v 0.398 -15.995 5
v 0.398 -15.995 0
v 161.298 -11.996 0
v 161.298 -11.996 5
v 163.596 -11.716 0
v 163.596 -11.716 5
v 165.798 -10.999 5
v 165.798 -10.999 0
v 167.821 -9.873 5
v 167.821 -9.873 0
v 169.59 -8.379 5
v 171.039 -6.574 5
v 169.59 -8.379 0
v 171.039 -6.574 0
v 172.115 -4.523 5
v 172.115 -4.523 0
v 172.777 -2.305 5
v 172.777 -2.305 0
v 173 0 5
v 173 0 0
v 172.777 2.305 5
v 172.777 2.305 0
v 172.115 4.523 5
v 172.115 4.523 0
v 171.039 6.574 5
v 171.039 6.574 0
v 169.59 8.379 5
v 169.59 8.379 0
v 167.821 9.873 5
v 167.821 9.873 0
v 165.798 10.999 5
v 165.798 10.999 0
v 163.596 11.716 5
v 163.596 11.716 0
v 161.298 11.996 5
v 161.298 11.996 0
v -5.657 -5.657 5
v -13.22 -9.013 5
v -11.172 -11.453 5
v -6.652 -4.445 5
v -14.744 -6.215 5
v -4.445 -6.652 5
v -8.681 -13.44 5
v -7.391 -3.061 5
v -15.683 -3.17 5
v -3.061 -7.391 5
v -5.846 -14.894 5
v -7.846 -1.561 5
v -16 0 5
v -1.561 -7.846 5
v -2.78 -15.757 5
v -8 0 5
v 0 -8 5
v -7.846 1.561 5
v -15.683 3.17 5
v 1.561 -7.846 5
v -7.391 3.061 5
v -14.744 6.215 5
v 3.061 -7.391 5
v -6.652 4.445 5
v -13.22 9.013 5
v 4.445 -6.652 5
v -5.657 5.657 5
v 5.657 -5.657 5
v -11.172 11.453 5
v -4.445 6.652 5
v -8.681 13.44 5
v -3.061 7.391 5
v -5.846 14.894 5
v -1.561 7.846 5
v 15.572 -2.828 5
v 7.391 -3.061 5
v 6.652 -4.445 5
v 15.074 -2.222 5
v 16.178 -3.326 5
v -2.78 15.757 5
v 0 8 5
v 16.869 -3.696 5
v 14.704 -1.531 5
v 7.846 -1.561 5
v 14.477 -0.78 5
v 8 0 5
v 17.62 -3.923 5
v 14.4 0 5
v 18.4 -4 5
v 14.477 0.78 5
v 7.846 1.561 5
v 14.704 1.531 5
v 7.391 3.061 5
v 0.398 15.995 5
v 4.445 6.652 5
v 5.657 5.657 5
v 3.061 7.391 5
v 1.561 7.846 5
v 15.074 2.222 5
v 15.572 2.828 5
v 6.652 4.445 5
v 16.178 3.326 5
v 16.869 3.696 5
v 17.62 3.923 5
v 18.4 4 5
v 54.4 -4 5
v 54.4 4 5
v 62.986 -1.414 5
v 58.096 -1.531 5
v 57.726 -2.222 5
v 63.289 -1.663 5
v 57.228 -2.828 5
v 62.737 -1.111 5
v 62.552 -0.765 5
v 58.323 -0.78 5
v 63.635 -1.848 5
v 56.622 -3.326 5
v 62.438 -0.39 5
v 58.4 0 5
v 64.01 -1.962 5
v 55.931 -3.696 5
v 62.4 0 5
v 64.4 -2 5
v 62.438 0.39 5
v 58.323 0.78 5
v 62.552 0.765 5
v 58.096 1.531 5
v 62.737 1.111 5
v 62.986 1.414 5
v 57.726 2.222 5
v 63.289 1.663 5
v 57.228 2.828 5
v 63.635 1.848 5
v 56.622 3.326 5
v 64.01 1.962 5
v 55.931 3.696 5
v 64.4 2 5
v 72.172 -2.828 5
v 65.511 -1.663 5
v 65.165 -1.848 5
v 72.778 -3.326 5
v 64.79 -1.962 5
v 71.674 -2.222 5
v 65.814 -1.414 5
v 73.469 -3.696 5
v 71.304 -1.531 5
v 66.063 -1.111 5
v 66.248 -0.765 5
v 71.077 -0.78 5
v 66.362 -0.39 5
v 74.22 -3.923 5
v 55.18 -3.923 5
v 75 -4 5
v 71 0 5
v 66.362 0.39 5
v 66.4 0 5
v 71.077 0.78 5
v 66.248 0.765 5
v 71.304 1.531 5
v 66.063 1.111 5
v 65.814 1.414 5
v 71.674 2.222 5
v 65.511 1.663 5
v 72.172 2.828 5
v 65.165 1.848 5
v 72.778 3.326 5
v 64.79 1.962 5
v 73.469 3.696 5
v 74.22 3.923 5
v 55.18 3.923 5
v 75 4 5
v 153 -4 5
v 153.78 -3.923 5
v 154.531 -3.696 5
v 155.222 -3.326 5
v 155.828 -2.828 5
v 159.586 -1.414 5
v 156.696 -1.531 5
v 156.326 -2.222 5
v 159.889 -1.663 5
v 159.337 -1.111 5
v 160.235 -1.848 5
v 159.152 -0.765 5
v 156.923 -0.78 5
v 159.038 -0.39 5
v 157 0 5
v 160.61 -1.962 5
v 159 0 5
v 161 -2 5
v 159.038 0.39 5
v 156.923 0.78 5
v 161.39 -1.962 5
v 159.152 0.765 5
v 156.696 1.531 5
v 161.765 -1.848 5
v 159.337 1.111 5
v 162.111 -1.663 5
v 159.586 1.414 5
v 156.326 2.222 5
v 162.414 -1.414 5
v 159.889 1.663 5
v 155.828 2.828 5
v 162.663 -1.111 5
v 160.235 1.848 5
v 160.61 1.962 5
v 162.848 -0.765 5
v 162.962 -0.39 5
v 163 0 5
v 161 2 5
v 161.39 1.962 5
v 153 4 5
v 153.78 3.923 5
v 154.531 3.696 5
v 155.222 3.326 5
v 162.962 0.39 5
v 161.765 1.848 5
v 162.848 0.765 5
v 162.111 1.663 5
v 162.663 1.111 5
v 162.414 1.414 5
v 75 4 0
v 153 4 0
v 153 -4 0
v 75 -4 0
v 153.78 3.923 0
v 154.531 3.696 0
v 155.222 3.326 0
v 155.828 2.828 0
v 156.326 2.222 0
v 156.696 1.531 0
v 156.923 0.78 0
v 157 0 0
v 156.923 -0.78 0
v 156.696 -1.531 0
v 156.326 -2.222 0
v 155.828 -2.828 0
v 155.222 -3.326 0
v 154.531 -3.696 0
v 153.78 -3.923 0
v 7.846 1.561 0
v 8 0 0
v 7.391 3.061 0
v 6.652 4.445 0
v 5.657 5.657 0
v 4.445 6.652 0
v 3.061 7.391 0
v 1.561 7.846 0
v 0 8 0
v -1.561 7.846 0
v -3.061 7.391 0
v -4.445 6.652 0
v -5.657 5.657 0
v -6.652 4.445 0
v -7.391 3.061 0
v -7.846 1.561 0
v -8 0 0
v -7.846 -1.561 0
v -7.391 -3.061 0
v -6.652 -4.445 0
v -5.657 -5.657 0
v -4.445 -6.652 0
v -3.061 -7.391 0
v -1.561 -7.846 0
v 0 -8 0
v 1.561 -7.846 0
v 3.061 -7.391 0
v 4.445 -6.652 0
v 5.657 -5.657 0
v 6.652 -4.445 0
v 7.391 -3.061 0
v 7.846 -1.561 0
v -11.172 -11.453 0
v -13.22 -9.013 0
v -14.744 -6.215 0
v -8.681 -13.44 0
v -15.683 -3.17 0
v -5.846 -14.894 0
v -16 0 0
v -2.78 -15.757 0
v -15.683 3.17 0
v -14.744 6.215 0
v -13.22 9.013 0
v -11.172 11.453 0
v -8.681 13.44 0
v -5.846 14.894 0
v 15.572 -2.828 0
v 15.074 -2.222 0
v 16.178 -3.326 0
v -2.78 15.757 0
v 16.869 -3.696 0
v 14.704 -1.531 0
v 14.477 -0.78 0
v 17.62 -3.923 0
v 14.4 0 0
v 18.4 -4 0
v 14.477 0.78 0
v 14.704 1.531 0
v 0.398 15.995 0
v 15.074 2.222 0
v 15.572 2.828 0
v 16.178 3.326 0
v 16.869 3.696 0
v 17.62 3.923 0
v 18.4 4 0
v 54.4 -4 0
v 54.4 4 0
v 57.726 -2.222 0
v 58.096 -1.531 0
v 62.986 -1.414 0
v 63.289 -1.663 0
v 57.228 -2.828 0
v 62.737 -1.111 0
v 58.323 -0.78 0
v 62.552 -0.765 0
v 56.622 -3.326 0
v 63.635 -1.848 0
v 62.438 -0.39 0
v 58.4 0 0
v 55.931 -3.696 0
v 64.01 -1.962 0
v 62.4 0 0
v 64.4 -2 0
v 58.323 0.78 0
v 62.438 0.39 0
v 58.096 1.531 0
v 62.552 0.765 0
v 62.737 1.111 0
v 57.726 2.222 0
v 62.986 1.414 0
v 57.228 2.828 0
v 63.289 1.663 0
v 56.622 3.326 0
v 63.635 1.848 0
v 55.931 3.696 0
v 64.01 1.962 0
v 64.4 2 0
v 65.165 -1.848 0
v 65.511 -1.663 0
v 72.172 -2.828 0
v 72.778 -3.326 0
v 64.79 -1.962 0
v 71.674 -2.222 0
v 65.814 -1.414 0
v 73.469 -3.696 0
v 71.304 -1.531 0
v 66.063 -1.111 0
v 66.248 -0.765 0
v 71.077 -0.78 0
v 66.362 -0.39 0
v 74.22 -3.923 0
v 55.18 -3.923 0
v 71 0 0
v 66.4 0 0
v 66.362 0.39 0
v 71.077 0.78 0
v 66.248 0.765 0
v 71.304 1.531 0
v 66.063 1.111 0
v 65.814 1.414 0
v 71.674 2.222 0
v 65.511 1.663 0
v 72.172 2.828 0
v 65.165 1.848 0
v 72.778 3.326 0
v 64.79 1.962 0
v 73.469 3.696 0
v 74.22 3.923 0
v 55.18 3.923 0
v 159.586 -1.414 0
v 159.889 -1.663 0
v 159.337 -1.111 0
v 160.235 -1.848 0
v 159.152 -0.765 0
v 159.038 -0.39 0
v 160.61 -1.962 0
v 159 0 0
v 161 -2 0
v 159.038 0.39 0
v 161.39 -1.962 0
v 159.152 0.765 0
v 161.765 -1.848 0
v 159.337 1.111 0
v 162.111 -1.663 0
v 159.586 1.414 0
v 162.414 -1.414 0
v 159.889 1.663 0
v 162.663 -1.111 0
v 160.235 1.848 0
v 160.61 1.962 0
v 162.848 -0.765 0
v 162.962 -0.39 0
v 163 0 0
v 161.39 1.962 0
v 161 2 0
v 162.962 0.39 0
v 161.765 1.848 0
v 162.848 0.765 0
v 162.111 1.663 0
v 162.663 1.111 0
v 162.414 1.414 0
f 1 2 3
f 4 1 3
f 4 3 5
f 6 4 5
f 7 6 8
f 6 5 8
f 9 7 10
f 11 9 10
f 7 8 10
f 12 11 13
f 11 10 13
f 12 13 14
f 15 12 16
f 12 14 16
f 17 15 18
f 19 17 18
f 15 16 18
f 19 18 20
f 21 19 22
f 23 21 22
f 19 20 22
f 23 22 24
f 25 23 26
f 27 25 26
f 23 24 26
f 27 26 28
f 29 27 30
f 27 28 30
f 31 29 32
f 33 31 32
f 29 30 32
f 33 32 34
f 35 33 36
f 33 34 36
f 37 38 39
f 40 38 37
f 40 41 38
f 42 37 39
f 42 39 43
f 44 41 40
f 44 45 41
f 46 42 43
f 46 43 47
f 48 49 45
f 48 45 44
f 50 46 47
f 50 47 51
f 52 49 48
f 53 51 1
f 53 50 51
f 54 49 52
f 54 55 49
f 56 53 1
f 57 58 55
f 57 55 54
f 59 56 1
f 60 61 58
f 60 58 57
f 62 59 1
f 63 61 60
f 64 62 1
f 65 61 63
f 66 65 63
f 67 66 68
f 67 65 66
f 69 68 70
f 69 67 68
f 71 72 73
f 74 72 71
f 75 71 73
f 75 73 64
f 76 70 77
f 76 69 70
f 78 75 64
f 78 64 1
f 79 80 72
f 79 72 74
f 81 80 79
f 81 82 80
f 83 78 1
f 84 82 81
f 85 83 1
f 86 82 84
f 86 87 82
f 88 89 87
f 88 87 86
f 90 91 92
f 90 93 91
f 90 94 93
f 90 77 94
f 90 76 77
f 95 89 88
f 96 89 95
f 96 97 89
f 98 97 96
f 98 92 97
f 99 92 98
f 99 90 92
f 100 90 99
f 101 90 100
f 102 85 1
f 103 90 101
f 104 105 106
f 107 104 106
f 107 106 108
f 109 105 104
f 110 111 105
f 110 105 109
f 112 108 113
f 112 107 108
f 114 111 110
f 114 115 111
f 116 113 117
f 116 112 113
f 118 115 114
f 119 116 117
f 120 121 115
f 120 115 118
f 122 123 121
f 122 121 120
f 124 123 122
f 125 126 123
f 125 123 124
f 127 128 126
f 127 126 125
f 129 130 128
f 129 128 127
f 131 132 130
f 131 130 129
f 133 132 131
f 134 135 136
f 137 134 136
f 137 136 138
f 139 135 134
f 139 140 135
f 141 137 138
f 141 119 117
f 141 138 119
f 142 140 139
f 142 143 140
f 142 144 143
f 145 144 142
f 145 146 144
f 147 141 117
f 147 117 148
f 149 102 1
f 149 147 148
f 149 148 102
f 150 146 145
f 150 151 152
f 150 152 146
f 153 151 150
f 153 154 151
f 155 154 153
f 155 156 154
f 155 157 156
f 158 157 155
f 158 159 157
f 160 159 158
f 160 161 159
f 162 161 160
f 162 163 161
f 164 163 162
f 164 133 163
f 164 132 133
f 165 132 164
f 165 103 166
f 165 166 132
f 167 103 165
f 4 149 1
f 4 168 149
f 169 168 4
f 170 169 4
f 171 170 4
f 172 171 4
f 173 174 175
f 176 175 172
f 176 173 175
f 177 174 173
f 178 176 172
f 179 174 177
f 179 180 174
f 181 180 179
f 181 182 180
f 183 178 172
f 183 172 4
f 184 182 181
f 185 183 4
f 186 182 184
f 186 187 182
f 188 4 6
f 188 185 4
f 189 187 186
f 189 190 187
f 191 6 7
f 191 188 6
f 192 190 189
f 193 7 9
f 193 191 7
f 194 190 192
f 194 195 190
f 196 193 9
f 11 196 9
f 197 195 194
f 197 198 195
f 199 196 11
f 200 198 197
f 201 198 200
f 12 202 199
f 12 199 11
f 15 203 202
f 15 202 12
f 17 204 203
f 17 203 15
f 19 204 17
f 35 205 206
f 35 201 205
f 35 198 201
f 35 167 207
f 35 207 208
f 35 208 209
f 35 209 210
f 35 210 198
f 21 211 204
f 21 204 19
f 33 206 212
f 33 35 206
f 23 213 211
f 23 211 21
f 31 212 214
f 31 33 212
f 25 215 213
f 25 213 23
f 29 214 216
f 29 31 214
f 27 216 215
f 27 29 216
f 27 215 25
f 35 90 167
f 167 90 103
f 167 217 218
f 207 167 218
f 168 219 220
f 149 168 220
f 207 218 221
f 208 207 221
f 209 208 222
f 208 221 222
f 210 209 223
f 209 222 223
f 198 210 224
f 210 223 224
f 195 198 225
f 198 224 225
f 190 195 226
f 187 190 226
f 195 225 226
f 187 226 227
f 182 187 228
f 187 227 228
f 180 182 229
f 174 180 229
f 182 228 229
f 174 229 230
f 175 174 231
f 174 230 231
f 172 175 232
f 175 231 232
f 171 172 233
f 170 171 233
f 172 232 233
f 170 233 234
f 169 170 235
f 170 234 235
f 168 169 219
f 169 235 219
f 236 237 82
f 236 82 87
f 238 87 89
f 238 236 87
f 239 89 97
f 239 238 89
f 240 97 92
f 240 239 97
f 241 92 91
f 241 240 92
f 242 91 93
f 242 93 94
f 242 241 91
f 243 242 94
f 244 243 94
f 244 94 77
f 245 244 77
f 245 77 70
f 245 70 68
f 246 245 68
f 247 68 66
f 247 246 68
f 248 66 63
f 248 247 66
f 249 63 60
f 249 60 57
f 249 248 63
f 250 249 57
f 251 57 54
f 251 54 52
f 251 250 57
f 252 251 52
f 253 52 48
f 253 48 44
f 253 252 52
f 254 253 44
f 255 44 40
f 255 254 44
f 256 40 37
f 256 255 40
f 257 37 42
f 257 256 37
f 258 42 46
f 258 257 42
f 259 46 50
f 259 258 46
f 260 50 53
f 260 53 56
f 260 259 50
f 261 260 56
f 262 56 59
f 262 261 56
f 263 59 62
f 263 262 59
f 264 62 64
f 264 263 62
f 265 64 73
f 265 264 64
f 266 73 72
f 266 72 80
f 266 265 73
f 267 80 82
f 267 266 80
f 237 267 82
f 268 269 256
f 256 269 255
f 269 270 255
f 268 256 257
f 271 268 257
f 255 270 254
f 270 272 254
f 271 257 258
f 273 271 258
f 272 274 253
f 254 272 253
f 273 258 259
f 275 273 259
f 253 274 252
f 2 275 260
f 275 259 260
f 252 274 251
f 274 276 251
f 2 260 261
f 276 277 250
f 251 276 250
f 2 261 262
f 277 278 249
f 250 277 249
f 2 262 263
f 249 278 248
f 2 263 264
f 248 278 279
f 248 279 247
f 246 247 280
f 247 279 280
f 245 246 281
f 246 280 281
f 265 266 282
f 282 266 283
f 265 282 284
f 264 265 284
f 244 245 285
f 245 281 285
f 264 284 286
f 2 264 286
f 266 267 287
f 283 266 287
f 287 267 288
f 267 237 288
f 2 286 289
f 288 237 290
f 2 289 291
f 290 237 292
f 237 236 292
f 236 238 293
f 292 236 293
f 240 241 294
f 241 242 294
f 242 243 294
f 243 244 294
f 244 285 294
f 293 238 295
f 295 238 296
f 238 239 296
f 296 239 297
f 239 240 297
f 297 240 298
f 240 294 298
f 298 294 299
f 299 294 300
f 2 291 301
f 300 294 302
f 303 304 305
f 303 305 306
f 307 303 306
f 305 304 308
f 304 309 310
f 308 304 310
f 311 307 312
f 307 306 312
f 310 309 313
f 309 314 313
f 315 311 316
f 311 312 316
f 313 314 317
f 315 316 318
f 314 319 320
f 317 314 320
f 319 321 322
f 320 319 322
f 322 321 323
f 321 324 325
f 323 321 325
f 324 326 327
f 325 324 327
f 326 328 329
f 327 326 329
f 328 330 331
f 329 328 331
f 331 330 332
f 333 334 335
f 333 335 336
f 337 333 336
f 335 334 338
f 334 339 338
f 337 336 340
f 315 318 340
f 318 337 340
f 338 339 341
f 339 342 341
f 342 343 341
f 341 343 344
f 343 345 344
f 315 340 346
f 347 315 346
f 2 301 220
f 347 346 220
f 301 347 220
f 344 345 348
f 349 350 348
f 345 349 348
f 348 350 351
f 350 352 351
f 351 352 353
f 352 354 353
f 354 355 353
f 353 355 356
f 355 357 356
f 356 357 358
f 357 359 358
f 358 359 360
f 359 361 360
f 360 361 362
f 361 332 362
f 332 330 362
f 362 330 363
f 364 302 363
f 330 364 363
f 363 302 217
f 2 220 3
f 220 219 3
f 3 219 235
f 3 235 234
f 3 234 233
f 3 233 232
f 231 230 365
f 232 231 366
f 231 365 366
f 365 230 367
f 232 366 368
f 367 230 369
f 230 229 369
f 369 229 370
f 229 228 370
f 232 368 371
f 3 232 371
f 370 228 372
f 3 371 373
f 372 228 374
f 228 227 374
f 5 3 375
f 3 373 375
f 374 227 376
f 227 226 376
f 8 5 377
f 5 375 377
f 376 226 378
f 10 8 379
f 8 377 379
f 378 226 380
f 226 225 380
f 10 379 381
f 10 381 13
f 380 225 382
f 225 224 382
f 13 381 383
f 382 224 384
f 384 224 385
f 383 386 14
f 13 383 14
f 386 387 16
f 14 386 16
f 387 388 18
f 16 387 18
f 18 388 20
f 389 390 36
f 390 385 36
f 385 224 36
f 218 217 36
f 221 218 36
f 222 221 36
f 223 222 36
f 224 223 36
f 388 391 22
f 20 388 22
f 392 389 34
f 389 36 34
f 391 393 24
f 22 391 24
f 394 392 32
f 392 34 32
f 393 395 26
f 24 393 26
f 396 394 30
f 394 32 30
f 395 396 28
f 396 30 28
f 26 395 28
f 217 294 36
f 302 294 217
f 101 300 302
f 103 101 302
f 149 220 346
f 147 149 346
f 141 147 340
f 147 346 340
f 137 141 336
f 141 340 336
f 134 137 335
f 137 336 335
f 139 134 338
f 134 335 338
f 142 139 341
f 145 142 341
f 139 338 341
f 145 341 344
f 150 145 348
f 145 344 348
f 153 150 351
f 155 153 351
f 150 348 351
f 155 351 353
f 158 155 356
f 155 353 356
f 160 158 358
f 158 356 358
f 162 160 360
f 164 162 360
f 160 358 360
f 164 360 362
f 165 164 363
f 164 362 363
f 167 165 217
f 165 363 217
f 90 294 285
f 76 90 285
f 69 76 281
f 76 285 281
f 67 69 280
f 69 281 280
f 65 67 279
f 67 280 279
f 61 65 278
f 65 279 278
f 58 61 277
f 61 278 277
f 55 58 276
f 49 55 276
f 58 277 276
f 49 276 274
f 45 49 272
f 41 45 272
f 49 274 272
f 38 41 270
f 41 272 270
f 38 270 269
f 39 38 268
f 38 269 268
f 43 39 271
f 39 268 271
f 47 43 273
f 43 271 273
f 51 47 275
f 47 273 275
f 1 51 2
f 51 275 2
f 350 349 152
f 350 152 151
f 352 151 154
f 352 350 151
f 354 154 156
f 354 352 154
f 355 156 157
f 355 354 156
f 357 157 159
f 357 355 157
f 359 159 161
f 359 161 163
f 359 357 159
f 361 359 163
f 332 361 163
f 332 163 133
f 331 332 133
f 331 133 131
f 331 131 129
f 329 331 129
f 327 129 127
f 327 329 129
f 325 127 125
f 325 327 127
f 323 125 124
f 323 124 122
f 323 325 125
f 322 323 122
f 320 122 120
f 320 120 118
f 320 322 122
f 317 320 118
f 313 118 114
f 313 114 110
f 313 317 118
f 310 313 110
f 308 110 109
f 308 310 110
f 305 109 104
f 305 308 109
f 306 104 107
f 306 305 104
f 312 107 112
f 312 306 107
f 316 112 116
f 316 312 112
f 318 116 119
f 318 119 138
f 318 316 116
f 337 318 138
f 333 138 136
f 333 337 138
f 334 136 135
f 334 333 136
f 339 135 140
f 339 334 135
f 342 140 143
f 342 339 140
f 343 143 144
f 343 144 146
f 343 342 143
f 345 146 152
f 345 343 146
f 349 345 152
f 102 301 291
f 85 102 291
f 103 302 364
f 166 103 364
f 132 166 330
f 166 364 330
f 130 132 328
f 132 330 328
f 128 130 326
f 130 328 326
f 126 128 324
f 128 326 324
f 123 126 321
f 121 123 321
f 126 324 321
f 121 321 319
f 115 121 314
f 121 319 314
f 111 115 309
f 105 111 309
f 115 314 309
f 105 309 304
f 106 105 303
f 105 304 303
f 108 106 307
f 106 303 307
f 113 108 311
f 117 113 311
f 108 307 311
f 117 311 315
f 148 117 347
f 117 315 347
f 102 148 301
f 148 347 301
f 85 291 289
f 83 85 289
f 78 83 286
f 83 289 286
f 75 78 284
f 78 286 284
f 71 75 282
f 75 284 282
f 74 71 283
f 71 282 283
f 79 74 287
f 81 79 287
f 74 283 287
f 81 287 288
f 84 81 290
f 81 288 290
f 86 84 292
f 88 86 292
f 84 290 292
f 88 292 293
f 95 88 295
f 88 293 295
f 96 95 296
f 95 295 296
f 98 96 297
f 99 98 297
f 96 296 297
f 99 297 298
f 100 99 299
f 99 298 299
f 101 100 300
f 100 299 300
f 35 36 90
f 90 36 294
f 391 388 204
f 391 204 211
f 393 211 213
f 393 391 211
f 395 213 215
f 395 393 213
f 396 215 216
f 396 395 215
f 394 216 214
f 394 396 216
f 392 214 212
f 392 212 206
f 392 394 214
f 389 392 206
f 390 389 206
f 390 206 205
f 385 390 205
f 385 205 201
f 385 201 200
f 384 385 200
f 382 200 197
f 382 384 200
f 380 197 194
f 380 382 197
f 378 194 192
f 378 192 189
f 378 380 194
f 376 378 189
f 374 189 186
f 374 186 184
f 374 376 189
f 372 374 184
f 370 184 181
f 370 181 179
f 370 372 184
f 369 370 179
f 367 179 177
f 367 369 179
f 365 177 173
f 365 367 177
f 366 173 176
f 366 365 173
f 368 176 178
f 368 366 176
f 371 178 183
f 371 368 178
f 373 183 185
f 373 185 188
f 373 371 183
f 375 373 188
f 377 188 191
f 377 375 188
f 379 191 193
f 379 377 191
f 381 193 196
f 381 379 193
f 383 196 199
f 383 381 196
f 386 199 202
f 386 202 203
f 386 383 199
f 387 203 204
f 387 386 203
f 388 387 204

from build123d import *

# Parameters (mm, degrees)
SKETCH_1_R      = 8
SKETCH_1_R_2    = 2
EXTRUDE_1_DEPTH = 5


with BuildPart() as part:
    # 草图1 → 凸台-拉伸1 (new body)
    with BuildSketch(Plane.XY):
        with BuildLine():
            Line((0.397515528, -15.995061157), (161.298136646, -11.996295867))
            ThreePointArc((161.298136646, -11.996295867), (173, 0), (161.298136646, 11.996295867))
            Line((161.298136646, 11.996295867), (0.397515528, 15.995061157))
            ThreePointArc((0.397515528, 15.995061157), (-16, 0), (0.397515528, -15.995061157))
        make_face()
        Circle(SKETCH_1_R, mode=Mode.SUBTRACT)
        with Locations((161, 0)):
            Circle(SKETCH_1_R_2, mode=Mode.SUBTRACT)
        with Locations((64.4, 0)):
            Circle(SKETCH_1_R_2, mode=Mode.SUBTRACT)
        with BuildLine():
            Line((18.4, 4), (54.4, 4))
            ThreePointArc((54.4, 4), (58.4, 0), (54.4, -4))
            Line((54.4, -4), (18.4, -4))
            ThreePointArc((18.4, -4), (14.4, 0), (18.4, 4))
        make_face(mode=Mode.SUBTRACT)
        with BuildLine():
            Line((75, 4), (153, 4))
            ThreePointArc((153, 4), (157, 0), (153, -4))
            Line((153, -4), (75, -4))
            ThreePointArc((75, -4), (71, 0), (75, 4))
        make_face(mode=Mode.SUBTRACT)
    extrude(amount=EXTRUDE_1_DEPTH)


solid = part.part
